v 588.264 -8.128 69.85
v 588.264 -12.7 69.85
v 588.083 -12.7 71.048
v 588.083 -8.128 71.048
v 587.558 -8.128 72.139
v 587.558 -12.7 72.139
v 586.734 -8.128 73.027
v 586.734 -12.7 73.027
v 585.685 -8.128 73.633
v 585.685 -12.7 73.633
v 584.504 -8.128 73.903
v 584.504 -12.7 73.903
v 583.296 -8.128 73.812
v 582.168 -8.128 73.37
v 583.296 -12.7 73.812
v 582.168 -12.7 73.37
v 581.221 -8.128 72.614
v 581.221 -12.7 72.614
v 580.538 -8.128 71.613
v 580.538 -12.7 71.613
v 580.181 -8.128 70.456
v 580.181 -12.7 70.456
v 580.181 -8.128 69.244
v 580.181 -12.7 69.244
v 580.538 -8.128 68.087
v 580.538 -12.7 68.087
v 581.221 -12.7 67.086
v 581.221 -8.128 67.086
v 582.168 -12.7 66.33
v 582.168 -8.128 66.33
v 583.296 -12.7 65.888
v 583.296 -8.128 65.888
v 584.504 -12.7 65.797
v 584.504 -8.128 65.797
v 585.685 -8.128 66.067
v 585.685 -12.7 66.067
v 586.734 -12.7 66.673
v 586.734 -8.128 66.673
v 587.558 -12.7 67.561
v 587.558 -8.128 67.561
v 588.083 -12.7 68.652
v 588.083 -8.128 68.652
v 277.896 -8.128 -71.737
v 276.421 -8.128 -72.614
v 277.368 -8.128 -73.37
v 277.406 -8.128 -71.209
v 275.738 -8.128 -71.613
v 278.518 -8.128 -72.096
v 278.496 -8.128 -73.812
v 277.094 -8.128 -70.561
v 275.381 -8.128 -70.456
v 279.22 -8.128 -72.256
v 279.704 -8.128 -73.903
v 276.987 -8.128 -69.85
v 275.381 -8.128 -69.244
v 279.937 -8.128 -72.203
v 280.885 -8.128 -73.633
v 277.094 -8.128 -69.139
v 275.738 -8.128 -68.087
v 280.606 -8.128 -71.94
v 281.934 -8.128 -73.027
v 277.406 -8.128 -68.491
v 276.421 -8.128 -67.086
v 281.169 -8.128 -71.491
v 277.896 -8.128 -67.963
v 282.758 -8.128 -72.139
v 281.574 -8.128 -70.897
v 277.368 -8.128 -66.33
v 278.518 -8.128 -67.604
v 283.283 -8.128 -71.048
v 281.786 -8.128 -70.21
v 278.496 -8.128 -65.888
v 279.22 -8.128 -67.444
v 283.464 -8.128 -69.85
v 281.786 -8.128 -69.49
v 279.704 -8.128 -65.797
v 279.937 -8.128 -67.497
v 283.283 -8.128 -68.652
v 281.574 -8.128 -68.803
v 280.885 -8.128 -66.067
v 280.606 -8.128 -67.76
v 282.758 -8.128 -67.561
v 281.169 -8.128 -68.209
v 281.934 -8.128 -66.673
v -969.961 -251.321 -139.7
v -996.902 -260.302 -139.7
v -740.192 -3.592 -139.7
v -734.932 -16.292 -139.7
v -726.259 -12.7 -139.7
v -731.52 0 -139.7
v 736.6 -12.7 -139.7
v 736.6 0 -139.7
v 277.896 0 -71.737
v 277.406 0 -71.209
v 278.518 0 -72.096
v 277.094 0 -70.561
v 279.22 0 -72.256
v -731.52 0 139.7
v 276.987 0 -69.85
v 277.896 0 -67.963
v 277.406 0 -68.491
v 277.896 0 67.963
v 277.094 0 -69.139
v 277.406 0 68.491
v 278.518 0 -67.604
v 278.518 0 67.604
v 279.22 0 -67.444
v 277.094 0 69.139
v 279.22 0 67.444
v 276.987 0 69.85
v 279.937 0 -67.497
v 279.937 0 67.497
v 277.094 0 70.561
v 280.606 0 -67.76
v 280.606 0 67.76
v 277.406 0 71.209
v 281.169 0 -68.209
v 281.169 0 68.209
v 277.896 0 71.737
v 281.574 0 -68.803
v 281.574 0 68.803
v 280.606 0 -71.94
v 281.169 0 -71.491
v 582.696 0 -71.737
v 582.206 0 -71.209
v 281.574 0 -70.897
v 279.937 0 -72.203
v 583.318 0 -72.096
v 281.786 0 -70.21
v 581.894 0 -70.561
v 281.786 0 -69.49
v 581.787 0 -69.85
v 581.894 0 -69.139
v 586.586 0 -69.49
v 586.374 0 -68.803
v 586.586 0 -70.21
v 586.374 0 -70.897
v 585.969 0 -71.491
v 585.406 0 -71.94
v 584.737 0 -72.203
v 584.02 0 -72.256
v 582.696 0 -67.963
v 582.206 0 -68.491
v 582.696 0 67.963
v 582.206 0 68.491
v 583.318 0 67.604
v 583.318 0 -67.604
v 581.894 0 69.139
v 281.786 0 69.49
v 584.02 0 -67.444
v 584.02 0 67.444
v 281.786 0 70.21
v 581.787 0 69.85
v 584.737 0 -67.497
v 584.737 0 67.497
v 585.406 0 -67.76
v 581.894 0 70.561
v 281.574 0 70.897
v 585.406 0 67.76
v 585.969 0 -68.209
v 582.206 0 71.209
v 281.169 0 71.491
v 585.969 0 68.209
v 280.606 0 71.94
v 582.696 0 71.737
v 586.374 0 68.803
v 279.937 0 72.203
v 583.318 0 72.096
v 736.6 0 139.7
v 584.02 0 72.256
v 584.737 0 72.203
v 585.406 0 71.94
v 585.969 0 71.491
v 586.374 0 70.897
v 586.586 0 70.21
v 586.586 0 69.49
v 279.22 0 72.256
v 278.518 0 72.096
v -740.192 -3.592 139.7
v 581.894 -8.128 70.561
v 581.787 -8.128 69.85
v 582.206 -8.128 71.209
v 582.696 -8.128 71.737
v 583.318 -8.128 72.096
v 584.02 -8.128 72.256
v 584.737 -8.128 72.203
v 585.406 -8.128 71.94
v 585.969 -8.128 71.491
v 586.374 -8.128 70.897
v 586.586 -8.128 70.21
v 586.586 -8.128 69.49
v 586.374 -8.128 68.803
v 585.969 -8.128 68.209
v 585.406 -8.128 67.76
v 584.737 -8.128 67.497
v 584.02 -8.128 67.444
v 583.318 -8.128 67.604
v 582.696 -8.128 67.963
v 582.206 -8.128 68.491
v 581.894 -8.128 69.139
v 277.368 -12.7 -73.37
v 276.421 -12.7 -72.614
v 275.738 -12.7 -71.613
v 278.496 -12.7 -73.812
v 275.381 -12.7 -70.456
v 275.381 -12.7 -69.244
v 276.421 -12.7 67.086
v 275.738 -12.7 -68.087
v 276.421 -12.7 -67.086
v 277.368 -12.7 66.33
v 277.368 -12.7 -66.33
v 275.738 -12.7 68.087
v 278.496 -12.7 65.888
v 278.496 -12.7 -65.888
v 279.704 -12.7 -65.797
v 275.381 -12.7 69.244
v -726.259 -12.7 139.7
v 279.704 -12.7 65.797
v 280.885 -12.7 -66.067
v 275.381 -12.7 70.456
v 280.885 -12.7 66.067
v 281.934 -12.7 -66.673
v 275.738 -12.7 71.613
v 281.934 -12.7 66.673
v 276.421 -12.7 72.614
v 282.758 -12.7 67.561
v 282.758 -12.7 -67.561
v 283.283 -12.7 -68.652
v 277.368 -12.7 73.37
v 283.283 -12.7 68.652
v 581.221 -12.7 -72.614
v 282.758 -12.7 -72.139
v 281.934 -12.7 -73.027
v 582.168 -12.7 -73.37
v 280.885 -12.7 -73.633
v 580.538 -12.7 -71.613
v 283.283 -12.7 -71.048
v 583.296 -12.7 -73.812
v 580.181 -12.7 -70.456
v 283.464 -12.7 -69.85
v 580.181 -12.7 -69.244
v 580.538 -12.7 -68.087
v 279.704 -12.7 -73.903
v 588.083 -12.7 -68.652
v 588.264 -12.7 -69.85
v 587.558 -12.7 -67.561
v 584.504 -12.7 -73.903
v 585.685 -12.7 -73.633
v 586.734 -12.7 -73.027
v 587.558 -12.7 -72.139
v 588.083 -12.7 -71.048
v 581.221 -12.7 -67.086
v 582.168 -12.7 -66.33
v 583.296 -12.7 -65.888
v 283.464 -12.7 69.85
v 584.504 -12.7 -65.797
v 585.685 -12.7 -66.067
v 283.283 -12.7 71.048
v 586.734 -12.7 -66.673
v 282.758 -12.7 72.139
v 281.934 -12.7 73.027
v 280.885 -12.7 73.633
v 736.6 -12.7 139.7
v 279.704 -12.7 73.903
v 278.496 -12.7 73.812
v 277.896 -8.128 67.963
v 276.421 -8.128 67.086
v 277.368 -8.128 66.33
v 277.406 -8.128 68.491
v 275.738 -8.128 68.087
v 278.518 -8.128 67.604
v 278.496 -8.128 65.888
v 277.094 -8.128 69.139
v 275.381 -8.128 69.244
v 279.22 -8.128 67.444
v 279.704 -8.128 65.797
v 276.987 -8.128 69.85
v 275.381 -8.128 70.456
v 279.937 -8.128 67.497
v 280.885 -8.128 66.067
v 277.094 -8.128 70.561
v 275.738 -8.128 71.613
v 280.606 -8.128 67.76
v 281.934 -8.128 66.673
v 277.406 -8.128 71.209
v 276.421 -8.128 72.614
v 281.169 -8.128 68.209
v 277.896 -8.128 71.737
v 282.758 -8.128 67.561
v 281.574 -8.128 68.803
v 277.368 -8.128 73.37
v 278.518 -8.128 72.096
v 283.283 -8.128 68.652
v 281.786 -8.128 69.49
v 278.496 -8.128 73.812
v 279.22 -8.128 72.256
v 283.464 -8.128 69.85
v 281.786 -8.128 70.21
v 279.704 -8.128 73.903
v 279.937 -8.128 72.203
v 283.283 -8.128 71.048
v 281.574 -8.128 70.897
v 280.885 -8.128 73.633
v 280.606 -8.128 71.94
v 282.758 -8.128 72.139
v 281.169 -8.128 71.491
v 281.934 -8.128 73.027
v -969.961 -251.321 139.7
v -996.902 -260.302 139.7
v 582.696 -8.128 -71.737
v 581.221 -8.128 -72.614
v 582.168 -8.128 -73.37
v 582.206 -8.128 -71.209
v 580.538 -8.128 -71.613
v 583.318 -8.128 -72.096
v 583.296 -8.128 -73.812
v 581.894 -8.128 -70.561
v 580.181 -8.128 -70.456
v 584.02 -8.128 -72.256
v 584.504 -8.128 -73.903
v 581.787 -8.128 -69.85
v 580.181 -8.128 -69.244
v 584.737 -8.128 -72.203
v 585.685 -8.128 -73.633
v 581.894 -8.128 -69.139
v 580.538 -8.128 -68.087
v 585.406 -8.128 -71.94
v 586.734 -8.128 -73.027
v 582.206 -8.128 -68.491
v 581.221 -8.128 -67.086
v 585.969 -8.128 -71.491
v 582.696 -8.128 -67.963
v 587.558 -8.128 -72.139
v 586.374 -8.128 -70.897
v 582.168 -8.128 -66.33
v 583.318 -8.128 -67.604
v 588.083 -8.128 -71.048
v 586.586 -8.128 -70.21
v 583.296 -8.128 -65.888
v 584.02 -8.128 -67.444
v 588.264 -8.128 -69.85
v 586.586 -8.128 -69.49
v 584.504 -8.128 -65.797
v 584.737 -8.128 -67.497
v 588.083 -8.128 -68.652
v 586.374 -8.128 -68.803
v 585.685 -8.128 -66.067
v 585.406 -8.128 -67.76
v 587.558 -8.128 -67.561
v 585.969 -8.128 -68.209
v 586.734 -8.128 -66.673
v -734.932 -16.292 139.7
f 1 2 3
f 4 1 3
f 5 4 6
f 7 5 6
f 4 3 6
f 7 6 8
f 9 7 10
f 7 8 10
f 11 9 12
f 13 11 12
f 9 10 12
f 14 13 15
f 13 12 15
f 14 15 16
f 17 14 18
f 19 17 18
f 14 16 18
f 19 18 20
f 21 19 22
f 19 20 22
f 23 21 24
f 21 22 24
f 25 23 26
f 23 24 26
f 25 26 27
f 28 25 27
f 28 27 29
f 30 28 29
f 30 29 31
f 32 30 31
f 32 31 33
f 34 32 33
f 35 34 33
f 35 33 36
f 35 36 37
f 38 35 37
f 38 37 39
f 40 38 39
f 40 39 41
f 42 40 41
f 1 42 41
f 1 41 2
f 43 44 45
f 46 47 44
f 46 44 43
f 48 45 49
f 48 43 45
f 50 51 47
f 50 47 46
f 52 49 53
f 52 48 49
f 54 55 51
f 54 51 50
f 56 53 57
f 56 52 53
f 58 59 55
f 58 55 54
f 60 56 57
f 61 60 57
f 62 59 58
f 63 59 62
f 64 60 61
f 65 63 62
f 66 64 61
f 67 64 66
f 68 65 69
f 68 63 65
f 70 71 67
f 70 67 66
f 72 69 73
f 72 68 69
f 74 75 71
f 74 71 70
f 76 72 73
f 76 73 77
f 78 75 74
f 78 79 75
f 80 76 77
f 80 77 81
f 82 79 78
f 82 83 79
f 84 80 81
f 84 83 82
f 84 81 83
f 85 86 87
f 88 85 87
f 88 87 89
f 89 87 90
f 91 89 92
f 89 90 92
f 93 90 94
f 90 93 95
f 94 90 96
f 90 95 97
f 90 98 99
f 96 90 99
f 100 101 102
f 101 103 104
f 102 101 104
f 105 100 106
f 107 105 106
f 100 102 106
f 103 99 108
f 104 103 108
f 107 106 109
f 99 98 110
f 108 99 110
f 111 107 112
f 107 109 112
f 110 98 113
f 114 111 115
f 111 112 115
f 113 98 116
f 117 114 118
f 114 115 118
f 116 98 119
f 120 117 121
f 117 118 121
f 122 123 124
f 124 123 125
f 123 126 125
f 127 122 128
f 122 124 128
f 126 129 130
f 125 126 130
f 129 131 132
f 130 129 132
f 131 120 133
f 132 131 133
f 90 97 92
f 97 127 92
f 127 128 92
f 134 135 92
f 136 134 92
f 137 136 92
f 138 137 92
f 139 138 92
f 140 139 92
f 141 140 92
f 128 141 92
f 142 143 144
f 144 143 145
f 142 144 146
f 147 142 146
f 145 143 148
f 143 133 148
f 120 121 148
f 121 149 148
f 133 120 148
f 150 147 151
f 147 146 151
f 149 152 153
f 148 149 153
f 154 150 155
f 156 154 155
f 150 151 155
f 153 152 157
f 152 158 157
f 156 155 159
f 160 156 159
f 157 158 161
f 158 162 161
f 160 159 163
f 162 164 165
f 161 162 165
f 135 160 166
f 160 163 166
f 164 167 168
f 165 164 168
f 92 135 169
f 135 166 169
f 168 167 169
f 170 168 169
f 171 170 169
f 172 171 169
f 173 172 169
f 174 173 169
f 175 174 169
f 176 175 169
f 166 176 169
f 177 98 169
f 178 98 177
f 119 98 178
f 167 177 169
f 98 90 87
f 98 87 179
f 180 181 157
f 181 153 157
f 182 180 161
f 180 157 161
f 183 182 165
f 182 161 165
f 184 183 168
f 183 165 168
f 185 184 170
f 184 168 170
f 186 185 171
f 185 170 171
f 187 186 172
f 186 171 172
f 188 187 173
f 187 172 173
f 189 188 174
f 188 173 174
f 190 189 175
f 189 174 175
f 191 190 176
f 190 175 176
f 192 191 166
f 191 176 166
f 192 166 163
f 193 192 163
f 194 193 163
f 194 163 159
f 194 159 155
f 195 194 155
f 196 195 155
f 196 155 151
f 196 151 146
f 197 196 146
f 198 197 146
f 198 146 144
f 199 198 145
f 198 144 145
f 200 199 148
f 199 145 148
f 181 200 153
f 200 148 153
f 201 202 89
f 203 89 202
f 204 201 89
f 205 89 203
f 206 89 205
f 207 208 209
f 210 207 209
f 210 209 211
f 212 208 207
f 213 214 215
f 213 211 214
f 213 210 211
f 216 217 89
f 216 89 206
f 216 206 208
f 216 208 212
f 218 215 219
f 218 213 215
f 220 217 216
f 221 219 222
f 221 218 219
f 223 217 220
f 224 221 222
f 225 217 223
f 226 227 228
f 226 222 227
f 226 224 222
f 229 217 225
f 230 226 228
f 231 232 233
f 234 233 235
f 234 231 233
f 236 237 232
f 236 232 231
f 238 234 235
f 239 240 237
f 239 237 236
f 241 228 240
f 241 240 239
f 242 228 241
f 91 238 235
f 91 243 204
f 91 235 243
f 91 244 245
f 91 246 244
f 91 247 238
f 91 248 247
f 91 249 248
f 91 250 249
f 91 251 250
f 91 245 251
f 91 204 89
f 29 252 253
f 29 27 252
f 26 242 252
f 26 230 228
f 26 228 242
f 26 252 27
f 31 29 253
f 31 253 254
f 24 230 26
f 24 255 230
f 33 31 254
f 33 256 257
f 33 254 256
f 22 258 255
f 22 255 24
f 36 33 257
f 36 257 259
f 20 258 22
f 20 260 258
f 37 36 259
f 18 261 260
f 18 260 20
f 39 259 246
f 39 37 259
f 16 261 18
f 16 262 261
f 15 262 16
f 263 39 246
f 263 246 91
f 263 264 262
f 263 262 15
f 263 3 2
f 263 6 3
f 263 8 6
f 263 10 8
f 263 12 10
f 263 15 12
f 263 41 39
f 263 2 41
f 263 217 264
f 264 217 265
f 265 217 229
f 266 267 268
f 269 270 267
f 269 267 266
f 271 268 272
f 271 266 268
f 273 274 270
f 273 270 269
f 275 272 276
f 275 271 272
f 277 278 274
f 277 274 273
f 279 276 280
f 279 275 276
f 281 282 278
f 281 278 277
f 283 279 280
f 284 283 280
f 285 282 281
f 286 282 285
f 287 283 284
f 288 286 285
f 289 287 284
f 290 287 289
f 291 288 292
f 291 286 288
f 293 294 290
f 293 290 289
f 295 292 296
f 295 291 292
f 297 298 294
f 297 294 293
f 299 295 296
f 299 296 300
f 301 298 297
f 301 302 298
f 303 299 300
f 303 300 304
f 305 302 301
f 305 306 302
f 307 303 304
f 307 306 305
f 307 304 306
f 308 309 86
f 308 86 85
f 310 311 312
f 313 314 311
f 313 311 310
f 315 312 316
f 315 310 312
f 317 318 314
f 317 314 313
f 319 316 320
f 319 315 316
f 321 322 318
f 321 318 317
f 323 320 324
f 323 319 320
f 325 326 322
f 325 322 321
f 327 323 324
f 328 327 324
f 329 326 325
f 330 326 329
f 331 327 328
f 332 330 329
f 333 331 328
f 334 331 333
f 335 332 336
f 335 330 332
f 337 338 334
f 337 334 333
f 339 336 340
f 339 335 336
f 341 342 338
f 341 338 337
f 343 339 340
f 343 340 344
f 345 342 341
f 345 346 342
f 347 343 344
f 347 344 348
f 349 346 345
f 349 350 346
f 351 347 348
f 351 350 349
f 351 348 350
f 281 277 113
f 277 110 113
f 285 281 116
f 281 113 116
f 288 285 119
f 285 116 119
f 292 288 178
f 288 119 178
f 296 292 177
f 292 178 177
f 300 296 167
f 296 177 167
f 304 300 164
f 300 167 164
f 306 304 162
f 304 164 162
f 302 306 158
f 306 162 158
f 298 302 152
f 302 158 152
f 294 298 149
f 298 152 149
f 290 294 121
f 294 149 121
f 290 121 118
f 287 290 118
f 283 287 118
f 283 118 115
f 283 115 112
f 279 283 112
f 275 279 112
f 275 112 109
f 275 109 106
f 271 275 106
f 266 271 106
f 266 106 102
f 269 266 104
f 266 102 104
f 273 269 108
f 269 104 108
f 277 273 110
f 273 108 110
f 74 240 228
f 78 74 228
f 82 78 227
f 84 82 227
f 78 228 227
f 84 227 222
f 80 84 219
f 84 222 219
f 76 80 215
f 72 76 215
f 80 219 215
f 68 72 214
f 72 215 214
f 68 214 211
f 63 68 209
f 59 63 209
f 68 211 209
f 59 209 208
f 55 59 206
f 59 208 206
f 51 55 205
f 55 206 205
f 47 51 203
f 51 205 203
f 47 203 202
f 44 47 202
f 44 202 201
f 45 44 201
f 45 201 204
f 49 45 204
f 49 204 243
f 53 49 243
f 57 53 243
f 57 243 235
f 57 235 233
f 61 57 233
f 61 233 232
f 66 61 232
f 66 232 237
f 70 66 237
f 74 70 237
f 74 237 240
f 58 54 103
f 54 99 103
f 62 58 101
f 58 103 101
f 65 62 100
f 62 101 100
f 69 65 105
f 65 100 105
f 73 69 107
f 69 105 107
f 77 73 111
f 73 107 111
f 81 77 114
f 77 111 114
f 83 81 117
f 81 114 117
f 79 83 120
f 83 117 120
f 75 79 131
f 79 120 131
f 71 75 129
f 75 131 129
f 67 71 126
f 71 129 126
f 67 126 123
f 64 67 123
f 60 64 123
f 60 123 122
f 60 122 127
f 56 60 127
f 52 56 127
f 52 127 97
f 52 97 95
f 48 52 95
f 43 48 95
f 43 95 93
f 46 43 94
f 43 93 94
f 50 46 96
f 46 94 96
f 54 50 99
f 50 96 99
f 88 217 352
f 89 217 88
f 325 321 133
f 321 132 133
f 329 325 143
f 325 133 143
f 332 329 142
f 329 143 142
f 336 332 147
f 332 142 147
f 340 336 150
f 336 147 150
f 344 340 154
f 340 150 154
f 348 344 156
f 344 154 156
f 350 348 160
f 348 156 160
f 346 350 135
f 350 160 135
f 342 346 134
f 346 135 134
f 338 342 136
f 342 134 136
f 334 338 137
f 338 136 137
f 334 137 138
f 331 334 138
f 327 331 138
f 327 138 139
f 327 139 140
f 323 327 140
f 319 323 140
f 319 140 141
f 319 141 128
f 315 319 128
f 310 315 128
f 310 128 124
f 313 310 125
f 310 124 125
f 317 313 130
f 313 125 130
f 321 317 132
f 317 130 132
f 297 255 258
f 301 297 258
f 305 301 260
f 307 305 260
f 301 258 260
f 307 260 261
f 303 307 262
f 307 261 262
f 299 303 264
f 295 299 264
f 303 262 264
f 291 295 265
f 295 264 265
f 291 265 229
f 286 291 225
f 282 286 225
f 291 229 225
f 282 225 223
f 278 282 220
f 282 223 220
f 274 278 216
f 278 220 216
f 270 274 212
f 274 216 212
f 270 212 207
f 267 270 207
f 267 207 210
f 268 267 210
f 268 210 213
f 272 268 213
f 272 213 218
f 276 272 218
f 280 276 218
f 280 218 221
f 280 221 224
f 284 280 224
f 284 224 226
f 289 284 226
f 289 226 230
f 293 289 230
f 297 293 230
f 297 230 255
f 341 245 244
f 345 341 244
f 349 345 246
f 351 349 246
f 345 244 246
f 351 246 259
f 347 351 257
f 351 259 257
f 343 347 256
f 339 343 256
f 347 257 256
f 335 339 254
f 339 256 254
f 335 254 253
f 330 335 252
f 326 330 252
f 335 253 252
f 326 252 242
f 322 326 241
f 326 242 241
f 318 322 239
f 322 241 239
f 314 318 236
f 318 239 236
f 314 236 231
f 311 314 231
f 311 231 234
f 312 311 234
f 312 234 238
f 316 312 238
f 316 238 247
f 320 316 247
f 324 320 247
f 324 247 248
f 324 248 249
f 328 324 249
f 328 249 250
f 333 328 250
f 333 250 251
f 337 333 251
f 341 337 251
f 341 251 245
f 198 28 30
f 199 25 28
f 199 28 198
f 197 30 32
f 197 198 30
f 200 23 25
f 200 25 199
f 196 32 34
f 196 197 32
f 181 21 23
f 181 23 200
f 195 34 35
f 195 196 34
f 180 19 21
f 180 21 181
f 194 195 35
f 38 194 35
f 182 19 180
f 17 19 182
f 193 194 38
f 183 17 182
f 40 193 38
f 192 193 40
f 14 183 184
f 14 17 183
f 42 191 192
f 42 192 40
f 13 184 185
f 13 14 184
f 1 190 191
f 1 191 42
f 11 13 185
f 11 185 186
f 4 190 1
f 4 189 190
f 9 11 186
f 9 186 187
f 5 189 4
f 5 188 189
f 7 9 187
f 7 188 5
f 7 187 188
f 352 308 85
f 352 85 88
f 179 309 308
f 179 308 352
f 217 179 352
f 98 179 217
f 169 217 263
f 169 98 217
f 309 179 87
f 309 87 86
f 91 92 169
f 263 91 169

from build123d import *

# Parameters (mm, degrees)
F0_W           = 1473.2
F0_H           = 279.4
F1_DEPTH       = 12.7
F3_DEPTH       = 279.4
F4_SIZE        = 5.08
F6_D           = 4.826
F6_CBORE_D     = 8.128
F6_CBORE_DEPTH = 4.572


with BuildPart() as f1:
    # F0 (on Front) → F1 (new body)
    with BuildSketch(Plane.XZ):
        Rectangle(F0_W, F0_H)
    extrude(amount=F1_DEPTH)

    # F2 (on face) → F3 (join)
    with BuildSketch(Plane.XY.offset(139.7)):
        Polygon((-731.3394877579, -12.7), (-736.6, -12.7), (-736.6, 0), (-996.9017039253, -260.3017039253), (-969.9609355621, -251.3214478042), align=None)
    extrude(amount=-F3_DEPTH)

    # F4
    f4_edges = [f1.edges().sort_by_distance(p)[0] for p in [
        (-736.6, 0, 0),
        (-731.339488, -12.7, 0),
    ]]
    chamfer(f4_edges, length=F4_SIZE)

    # F6 (through all)
    with Locations(Plane.XZ.offset(12.7)):
        with Locations((279.4, 69.85), (279.4, -69.85), (584.2, -69.85), (584.2, 69.85)):
            CounterBoreHole(F6_D / 2, F6_CBORE_D / 2, F6_CBORE_DEPTH)


solid = f1.part
